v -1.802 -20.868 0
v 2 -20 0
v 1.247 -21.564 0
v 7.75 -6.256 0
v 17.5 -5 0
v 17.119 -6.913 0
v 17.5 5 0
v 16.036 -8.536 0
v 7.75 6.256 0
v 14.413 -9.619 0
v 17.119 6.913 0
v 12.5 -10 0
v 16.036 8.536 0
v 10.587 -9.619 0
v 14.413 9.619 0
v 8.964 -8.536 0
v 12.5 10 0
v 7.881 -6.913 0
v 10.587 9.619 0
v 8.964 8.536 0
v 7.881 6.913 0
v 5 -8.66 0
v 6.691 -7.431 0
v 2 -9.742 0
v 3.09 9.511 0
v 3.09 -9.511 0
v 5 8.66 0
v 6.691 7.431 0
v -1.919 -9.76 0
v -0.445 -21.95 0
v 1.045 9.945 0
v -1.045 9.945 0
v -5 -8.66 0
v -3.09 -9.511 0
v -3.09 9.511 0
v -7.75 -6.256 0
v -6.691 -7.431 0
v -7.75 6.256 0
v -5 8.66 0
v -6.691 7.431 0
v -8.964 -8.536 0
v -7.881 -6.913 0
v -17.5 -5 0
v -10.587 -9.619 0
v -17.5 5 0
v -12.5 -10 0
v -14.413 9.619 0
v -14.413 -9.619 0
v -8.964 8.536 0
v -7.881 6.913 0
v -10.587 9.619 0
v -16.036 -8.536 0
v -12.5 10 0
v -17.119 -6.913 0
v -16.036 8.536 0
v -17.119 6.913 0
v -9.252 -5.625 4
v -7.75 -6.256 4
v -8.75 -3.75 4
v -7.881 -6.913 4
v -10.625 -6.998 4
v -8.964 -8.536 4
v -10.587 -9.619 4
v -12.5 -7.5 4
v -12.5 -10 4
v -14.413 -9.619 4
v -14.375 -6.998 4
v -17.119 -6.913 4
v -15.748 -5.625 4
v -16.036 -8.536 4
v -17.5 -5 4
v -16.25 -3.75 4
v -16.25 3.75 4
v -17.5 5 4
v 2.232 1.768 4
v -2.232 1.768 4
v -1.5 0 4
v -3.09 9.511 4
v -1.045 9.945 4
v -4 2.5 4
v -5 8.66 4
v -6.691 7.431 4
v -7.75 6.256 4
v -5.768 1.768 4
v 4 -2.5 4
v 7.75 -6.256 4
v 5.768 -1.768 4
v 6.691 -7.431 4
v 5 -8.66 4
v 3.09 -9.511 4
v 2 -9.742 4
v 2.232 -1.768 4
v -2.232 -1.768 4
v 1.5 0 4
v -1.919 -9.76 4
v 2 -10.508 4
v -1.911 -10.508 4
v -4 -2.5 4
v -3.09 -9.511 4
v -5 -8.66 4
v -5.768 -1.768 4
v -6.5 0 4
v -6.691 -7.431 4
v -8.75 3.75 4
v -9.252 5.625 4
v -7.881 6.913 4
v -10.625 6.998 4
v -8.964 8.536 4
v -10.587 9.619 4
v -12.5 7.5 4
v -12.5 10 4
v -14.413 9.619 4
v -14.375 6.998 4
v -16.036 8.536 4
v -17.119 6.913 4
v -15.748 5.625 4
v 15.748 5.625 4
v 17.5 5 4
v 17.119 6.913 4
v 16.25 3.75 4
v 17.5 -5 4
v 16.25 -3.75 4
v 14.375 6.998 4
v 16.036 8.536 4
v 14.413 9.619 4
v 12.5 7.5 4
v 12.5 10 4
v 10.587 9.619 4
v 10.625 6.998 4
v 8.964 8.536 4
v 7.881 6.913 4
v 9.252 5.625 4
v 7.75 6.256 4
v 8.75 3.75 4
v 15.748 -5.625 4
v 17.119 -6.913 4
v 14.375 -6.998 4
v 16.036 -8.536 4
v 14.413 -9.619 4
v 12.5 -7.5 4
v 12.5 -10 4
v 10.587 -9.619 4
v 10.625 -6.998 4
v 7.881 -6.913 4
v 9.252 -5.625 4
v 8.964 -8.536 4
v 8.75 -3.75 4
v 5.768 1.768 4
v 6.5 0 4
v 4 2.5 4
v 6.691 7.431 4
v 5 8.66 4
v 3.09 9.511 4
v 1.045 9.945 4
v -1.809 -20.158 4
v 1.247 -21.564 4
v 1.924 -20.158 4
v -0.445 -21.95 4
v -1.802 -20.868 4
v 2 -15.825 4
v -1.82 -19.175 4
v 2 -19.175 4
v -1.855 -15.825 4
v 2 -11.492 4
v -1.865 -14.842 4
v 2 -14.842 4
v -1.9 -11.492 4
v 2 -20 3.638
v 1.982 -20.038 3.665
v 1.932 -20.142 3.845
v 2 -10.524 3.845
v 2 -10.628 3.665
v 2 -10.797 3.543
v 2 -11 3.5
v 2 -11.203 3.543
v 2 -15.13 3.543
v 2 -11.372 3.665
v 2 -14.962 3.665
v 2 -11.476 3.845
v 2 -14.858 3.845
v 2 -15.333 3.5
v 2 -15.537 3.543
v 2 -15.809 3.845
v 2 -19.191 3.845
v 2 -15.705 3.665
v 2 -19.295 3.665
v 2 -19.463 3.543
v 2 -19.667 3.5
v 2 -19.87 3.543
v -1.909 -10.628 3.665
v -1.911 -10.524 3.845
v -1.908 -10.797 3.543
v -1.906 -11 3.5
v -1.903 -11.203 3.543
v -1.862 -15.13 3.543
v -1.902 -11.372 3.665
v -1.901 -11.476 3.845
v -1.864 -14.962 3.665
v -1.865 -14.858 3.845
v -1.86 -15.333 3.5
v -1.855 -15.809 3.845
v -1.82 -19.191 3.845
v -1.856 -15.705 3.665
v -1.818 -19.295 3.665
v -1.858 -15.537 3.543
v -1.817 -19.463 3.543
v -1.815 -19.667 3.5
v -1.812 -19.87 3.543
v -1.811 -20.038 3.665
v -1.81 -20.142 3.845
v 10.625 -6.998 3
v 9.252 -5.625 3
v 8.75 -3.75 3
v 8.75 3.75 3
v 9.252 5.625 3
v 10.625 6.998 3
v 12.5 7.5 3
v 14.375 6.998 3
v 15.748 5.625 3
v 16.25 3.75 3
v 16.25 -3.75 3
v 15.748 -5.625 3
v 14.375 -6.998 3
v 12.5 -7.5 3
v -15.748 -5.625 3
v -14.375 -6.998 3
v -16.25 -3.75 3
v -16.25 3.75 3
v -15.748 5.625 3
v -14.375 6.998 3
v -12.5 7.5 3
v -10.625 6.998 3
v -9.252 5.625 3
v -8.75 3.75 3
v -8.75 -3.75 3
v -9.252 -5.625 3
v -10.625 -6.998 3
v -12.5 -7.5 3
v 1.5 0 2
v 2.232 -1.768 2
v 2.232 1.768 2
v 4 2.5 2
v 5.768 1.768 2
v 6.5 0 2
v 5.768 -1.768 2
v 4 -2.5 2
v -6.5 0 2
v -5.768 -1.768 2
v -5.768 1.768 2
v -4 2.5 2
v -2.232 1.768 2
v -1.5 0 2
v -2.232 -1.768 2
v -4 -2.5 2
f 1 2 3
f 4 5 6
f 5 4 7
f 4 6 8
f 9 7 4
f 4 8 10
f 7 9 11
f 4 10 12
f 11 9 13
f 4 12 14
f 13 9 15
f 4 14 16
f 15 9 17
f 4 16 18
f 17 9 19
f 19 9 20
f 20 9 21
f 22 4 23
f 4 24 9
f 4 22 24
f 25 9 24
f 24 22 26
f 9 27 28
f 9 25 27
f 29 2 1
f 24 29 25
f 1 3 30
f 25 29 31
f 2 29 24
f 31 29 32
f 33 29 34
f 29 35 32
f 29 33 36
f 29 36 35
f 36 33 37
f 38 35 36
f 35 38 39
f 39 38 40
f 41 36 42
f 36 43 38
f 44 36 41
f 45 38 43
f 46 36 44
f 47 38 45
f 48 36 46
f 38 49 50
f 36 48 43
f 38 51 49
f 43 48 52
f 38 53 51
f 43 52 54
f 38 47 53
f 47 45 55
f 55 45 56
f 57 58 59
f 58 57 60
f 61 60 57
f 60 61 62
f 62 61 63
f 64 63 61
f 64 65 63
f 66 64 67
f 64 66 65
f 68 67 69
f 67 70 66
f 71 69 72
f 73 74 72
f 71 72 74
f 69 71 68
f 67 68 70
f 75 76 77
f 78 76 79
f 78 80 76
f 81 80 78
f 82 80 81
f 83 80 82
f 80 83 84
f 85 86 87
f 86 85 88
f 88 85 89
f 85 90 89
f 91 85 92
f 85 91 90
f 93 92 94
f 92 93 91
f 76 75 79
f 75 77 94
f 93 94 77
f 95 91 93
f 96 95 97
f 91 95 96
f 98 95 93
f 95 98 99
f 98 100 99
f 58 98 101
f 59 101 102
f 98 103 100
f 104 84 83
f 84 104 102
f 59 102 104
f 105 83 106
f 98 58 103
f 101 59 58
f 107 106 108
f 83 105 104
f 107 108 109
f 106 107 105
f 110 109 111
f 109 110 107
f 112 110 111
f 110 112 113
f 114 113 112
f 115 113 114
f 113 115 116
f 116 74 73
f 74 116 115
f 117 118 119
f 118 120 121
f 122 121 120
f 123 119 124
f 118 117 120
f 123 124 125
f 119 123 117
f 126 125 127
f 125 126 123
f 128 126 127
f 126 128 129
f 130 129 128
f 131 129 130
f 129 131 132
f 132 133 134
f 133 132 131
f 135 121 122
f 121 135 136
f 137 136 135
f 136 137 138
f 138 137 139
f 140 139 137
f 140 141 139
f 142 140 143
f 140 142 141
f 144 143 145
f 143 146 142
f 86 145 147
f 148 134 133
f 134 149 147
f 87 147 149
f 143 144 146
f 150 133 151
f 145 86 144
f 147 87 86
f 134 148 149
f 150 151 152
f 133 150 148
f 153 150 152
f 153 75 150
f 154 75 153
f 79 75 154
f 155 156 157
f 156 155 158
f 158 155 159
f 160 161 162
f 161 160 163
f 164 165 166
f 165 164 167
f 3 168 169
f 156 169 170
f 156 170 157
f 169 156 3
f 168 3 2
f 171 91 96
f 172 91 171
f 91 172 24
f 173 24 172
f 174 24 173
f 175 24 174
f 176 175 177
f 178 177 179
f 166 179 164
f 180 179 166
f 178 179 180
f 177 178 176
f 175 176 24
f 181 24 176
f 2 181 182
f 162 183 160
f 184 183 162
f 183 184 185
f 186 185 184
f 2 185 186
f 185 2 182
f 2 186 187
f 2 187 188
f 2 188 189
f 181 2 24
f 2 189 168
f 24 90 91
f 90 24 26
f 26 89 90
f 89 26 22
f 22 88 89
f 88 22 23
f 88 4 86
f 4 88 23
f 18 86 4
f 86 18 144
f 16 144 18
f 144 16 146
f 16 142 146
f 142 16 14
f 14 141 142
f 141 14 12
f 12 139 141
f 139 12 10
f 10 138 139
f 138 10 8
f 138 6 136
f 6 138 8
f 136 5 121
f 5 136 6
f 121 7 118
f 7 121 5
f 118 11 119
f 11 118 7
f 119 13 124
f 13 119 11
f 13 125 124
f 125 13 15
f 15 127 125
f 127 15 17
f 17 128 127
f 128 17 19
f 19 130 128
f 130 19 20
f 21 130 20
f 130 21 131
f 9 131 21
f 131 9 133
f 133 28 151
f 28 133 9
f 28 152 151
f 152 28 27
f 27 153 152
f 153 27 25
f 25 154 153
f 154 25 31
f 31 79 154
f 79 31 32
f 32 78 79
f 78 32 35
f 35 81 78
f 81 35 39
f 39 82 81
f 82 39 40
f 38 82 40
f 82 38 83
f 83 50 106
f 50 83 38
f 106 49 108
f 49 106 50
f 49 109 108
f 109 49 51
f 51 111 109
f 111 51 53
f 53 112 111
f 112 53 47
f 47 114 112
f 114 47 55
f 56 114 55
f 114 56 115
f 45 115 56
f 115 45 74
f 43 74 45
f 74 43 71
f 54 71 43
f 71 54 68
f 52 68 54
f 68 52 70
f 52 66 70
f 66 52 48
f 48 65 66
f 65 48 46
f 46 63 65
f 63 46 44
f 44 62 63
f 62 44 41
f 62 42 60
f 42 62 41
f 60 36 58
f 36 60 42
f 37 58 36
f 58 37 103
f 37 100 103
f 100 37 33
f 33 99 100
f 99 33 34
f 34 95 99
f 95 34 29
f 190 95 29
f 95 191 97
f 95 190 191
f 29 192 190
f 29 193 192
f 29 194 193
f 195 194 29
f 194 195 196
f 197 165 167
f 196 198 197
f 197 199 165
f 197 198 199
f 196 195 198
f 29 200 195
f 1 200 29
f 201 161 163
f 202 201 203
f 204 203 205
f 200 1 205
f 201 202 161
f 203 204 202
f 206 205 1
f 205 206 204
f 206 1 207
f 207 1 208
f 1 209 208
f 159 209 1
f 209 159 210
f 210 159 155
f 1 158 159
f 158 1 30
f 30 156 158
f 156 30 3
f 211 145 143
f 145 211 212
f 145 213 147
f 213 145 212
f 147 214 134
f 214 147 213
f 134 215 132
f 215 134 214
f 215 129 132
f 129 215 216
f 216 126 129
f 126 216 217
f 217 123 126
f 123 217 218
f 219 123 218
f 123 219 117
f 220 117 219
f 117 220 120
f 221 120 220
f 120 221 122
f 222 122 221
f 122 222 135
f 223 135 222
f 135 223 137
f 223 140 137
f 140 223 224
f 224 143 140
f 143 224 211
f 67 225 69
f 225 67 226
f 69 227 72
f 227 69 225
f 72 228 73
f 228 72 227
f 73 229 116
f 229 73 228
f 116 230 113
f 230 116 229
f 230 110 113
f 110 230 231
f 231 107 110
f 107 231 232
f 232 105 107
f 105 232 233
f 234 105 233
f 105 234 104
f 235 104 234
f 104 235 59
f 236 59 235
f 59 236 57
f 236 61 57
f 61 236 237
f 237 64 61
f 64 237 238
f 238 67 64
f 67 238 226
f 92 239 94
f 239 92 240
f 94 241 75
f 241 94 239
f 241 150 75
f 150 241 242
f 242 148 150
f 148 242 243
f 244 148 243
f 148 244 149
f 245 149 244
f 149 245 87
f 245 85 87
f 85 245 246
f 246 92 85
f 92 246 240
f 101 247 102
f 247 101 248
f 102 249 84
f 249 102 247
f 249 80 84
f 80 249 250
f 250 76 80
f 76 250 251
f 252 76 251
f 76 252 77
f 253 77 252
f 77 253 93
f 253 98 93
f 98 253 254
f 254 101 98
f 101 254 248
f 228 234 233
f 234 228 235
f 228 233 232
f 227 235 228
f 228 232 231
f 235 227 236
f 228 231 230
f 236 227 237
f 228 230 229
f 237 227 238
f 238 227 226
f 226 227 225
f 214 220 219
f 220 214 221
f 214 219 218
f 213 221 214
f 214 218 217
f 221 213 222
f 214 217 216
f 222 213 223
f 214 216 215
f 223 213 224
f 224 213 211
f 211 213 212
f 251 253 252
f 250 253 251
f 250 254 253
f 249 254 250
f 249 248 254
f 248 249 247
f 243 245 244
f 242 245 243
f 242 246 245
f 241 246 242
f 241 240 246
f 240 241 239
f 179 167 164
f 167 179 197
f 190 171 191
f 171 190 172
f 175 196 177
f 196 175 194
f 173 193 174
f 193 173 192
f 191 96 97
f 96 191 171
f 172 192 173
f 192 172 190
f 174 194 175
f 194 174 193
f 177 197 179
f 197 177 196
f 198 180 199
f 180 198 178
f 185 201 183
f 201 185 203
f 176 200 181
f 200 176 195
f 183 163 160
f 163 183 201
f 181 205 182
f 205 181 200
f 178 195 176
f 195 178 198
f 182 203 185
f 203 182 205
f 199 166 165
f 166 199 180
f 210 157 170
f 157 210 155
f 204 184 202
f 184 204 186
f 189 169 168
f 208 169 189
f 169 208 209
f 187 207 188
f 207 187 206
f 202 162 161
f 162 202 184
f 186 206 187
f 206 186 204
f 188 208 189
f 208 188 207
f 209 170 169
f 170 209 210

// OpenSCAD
headDia=20;
earDia=10;

module elephantEar(dia,height){
	hull(){
		translate([0, (height-dia)/2]) circle(d=dia);
		translate([0,-(height-dia)/2]) circle(d=dia);
	}
}

module trunk(length,width){
	hull(){
		square(width,center=true);
		translate([0,-length]) circle(d=width);
		}
}

module eyes(dia,sep){
	translate([ sep,0]) circle(dia);
	translate([-sep,0]) circle(dia);
}

module headBase(){
	translate([ (headDia*0.75)/2+earDia/2,0]) elephantEar(dia=earDia,height=headDia);
	translate([-(headDia*0.75)/2-earDia/2,0]) elephantEar(dia=earDia,height=headDia);
	circle(d=headDia);
	trunk(length=headDia,width=headDia/5);
}

module withEyes(){
difference(){
	headBase();
	eyes(dia=headDia/8,sep=headDia/5);
}
}

module withEarInset(){
	difference(){
		withEyes();
		translate([ ((headDia*0.75)/2+earDia/2),0]) elephantEar(dia=earDia*.75,height=headDia*.75);
		translate([-((headDia*0.75)/2+earDia/2),0]) elephantEar(dia=earDia*.75,height=headDia*.75);
	}
}

module trunkRibs(ribDepth,RibCount,TrunkLength,headDia,width,zTop){
firstNotch=(TrunkLength-headDia/2)*1.1;
notchGap=((TrunkLength+width)-firstNotch)/(RibCount);
	for(i=[0,1,RibCount-1]){
		translate([0,-firstNotch-(notchGap*i),zTop]) rotate([0,90,0]) cylinder(r=ribDepth,h=width,center=true, $fn=15);
	}
}

module mainBlock(){
linear_extrude(height=4) withEarInset();
linear_extrude(height=3) withEyes();
linear_extrude(height=2) headBase();
}

color("gray") difference(){
	mainBlock();
	trunkRibs(0.5,3,TrunkLength=headDia,headDia=headDia,width=headDia/5,zTop=4);
}

// Written in 2020 by Scopeuk
//
// To the extent possible under law, the author(s) have dedicated all
// copyright and related and neighboring rights to this software to the
// public domain worldwide. This software is distributed without any
// warranty.
//
// You should have received a copy of the CC0 Public Domain
// Dedication along with this software.
// If not, see <http://creativecommons.org/publicdomain/zero/1.0/>.
